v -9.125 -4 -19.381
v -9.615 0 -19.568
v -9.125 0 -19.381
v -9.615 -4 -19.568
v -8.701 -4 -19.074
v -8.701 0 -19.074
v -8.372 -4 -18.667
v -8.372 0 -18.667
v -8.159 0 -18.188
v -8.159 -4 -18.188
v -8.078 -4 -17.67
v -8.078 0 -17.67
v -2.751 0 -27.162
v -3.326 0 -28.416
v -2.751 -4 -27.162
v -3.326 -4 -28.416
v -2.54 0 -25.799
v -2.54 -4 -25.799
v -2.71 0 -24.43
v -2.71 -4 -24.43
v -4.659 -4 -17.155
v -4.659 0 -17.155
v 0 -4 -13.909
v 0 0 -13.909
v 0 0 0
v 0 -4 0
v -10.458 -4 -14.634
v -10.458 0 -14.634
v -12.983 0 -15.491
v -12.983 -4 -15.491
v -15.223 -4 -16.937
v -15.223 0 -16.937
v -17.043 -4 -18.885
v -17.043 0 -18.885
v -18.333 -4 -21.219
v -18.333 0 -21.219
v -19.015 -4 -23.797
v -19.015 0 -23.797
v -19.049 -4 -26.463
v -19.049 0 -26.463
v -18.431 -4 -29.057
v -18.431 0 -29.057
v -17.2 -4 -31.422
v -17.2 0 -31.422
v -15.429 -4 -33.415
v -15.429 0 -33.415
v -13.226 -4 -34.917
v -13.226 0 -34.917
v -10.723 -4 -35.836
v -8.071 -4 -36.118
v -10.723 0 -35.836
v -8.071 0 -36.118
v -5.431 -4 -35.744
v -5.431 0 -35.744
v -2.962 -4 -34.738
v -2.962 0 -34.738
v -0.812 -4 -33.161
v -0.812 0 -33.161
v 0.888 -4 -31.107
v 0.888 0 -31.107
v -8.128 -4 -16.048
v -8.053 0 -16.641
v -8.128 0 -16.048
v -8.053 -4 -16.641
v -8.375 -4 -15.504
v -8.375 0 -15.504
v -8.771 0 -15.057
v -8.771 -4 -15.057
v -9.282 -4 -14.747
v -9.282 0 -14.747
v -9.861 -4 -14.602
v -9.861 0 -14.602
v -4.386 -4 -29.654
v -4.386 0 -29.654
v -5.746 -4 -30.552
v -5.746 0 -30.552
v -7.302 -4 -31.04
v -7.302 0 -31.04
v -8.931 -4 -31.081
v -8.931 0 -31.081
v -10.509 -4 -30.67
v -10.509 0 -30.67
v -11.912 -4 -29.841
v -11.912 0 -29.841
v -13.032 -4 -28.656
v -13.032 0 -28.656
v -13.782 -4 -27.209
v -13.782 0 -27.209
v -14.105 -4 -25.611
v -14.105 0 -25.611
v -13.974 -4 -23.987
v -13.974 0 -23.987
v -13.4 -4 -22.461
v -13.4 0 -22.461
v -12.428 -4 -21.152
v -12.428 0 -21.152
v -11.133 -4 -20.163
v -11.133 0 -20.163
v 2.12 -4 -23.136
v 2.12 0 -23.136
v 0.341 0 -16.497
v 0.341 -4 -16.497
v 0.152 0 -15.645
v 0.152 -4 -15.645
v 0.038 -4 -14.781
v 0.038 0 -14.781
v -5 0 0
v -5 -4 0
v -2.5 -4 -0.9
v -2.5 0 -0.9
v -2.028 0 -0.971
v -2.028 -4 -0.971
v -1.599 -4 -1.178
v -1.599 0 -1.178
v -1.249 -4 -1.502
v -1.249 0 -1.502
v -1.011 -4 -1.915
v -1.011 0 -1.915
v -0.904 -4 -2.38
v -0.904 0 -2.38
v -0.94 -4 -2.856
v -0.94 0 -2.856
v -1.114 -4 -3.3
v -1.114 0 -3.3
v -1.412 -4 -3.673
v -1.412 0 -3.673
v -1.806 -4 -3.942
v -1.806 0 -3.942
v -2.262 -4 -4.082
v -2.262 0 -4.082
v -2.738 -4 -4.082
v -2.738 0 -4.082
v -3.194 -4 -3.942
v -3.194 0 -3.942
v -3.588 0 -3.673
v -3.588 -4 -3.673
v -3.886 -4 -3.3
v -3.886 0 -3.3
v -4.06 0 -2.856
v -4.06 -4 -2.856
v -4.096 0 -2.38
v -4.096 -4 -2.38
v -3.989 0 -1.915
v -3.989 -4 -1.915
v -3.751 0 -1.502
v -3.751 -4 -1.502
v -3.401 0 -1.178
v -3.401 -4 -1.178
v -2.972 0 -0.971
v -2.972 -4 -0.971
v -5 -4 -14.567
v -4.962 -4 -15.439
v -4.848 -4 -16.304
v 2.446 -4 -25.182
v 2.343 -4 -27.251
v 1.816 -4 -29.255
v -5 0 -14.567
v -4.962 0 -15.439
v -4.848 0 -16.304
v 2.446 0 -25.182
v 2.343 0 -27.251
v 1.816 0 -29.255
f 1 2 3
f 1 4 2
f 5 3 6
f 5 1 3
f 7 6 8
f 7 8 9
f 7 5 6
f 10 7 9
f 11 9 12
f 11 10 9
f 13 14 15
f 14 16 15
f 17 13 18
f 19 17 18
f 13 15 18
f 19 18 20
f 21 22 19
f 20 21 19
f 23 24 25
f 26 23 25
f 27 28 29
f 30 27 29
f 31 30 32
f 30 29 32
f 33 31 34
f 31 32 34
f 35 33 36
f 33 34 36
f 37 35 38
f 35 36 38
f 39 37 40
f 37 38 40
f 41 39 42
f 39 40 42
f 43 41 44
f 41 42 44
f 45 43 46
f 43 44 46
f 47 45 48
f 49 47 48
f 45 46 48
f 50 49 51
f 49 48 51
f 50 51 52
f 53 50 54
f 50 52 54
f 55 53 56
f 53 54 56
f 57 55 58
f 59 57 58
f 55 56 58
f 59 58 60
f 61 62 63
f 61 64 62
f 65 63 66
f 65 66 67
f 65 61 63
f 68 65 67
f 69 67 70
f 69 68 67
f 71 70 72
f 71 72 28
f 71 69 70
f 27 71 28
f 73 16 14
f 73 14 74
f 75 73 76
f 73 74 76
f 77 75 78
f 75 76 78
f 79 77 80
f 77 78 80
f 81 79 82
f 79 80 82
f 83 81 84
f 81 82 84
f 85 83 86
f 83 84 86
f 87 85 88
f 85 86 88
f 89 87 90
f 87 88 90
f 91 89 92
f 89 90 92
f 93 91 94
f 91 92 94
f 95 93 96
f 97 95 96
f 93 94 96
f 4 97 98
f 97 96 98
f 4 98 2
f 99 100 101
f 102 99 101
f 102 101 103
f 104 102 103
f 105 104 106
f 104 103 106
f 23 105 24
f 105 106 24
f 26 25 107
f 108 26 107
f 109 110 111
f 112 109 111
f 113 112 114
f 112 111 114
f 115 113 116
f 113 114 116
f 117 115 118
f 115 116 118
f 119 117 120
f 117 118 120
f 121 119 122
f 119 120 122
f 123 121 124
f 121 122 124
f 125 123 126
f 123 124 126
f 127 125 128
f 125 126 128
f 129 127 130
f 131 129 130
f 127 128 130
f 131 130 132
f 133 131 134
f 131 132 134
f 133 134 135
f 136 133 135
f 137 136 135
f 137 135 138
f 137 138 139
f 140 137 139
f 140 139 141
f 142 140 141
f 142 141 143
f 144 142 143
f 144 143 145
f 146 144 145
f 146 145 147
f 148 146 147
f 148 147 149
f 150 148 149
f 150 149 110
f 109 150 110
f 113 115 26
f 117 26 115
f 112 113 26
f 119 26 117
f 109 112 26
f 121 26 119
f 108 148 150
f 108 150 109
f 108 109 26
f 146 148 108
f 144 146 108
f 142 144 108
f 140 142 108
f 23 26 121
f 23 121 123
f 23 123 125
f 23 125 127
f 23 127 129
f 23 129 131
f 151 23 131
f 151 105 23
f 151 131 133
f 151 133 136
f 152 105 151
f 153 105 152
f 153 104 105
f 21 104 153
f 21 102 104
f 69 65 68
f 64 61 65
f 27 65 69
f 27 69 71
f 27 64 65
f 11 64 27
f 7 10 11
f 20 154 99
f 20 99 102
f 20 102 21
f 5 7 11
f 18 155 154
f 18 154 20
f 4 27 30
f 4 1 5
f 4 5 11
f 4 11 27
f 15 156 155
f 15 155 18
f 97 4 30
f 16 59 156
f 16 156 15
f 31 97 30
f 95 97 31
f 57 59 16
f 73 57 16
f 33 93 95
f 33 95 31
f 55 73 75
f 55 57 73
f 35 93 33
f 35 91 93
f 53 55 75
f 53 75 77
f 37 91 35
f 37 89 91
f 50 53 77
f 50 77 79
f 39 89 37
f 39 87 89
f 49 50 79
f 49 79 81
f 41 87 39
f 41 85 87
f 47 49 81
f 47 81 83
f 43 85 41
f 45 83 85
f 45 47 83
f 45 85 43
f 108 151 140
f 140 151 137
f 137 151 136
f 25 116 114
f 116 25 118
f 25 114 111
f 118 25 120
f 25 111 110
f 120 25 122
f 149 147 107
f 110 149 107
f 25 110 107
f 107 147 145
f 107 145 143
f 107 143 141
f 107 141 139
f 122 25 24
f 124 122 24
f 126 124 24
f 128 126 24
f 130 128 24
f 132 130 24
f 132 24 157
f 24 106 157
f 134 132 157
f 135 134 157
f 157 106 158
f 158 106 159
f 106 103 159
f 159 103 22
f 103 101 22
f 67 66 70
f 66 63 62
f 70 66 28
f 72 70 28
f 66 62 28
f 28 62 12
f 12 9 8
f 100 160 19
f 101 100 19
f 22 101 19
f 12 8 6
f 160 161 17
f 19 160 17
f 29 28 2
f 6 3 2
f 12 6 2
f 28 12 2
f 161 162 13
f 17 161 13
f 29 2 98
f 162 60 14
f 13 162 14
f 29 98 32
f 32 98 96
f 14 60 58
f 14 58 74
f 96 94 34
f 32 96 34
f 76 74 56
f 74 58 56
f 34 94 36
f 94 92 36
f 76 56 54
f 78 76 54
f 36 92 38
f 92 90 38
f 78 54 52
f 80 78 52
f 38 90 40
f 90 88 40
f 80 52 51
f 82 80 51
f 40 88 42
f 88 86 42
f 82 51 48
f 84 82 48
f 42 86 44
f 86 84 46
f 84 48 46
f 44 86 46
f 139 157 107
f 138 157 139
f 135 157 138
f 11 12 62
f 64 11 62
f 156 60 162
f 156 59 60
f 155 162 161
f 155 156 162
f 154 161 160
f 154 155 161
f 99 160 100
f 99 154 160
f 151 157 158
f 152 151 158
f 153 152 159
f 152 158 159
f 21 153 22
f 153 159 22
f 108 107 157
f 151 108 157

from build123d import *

# Parameters (mm, degrees)
BASE_FLANGE1_DEPTH = 4
FILLET1_R          = 2
FILLET2_R          = 5
FILLET3_R          = 10
SKETCH6_R          = 1.6
CUT_EXTRUDE1_DEPTH = 10


# Sheet-metal steps are written as plain solids
with BuildPart() as part:
    # Sketch1 → Base-Flange1 (new body)
    with BuildSketch(Plane(origin=(0, 0, 0), x_dir=(1, 0, 0), z_dir=(0, 1, 0))):
        with BuildLine():
            Line((0, 0), (-5, 0))
            Line((-5, 0), (-5, 14.567226763))
            ThreePointArc((-5, 14.567226763), (-4.914448614, 15.872488686), (-4.659258263, 17.155417214))
            Line((-4.659258263, 17.155417214), (-2.411809549, 25.543010002))
            ThreePointArc((-2.411809549, 25.543010002), (-12.545541462, 29.253521737), (-8.119779436, 19.41111094))
            Line((-8.119779436, 19.41111094), (-8, 14.412545857))
            ThreePointArc((-8, 14.412545857), (-15.893198966, 32.982001696), (2.588190451, 24.884747514))
            Line((2.588190451, 24.884747514), (0.340741737, 16.497154727))
            ThreePointArc((0.340741737, 16.497154727), (0.085551386, 15.214226198), (0, 13.908964276))
            Line((0, 13.908964276), (0, 0))
        make_face()
    extrude(amount=-BASE_FLANGE1_DEPTH)

    # Fillet1
    fillet1_edges = [part.edges().sort_by_distance(p)[0] for p in [
        (-8.119779436, -2, -19.41111094),
        (-8, -2, -14.412545857),
    ]]
    fillet(fillet1_edges, radius=FILLET1_R)

    # Fillet2
    fillet2_edges = [part.edges().sort_by_distance(p)[0] for p in [
        (-2.411809549, -2, -25.543010002),
    ]]
    fillet(fillet2_edges, radius=FILLET2_R)

    # Fillet3
    fillet3_edges = [part.edges().sort_by_distance(p)[0] for p in [
        (2.588190451, -2, -24.884747514),
    ]]
    fillet(fillet3_edges, radius=FILLET3_R)

    # Sketch6 → Cut-Extrude1 (cut)
    with BuildSketch(Plane(origin=(0, 0, 0), x_dir=(1, 0, 0), z_dir=(0, 1, 0))):
        with Locations(Location((-2.5, 2.5, 0), (0, 0, 270))):
            Circle(SKETCH6_R)
    extrude(amount=-CUT_EXTRUDE1_DEPTH, mode=Mode.SUBTRACT)


solid = part.part
